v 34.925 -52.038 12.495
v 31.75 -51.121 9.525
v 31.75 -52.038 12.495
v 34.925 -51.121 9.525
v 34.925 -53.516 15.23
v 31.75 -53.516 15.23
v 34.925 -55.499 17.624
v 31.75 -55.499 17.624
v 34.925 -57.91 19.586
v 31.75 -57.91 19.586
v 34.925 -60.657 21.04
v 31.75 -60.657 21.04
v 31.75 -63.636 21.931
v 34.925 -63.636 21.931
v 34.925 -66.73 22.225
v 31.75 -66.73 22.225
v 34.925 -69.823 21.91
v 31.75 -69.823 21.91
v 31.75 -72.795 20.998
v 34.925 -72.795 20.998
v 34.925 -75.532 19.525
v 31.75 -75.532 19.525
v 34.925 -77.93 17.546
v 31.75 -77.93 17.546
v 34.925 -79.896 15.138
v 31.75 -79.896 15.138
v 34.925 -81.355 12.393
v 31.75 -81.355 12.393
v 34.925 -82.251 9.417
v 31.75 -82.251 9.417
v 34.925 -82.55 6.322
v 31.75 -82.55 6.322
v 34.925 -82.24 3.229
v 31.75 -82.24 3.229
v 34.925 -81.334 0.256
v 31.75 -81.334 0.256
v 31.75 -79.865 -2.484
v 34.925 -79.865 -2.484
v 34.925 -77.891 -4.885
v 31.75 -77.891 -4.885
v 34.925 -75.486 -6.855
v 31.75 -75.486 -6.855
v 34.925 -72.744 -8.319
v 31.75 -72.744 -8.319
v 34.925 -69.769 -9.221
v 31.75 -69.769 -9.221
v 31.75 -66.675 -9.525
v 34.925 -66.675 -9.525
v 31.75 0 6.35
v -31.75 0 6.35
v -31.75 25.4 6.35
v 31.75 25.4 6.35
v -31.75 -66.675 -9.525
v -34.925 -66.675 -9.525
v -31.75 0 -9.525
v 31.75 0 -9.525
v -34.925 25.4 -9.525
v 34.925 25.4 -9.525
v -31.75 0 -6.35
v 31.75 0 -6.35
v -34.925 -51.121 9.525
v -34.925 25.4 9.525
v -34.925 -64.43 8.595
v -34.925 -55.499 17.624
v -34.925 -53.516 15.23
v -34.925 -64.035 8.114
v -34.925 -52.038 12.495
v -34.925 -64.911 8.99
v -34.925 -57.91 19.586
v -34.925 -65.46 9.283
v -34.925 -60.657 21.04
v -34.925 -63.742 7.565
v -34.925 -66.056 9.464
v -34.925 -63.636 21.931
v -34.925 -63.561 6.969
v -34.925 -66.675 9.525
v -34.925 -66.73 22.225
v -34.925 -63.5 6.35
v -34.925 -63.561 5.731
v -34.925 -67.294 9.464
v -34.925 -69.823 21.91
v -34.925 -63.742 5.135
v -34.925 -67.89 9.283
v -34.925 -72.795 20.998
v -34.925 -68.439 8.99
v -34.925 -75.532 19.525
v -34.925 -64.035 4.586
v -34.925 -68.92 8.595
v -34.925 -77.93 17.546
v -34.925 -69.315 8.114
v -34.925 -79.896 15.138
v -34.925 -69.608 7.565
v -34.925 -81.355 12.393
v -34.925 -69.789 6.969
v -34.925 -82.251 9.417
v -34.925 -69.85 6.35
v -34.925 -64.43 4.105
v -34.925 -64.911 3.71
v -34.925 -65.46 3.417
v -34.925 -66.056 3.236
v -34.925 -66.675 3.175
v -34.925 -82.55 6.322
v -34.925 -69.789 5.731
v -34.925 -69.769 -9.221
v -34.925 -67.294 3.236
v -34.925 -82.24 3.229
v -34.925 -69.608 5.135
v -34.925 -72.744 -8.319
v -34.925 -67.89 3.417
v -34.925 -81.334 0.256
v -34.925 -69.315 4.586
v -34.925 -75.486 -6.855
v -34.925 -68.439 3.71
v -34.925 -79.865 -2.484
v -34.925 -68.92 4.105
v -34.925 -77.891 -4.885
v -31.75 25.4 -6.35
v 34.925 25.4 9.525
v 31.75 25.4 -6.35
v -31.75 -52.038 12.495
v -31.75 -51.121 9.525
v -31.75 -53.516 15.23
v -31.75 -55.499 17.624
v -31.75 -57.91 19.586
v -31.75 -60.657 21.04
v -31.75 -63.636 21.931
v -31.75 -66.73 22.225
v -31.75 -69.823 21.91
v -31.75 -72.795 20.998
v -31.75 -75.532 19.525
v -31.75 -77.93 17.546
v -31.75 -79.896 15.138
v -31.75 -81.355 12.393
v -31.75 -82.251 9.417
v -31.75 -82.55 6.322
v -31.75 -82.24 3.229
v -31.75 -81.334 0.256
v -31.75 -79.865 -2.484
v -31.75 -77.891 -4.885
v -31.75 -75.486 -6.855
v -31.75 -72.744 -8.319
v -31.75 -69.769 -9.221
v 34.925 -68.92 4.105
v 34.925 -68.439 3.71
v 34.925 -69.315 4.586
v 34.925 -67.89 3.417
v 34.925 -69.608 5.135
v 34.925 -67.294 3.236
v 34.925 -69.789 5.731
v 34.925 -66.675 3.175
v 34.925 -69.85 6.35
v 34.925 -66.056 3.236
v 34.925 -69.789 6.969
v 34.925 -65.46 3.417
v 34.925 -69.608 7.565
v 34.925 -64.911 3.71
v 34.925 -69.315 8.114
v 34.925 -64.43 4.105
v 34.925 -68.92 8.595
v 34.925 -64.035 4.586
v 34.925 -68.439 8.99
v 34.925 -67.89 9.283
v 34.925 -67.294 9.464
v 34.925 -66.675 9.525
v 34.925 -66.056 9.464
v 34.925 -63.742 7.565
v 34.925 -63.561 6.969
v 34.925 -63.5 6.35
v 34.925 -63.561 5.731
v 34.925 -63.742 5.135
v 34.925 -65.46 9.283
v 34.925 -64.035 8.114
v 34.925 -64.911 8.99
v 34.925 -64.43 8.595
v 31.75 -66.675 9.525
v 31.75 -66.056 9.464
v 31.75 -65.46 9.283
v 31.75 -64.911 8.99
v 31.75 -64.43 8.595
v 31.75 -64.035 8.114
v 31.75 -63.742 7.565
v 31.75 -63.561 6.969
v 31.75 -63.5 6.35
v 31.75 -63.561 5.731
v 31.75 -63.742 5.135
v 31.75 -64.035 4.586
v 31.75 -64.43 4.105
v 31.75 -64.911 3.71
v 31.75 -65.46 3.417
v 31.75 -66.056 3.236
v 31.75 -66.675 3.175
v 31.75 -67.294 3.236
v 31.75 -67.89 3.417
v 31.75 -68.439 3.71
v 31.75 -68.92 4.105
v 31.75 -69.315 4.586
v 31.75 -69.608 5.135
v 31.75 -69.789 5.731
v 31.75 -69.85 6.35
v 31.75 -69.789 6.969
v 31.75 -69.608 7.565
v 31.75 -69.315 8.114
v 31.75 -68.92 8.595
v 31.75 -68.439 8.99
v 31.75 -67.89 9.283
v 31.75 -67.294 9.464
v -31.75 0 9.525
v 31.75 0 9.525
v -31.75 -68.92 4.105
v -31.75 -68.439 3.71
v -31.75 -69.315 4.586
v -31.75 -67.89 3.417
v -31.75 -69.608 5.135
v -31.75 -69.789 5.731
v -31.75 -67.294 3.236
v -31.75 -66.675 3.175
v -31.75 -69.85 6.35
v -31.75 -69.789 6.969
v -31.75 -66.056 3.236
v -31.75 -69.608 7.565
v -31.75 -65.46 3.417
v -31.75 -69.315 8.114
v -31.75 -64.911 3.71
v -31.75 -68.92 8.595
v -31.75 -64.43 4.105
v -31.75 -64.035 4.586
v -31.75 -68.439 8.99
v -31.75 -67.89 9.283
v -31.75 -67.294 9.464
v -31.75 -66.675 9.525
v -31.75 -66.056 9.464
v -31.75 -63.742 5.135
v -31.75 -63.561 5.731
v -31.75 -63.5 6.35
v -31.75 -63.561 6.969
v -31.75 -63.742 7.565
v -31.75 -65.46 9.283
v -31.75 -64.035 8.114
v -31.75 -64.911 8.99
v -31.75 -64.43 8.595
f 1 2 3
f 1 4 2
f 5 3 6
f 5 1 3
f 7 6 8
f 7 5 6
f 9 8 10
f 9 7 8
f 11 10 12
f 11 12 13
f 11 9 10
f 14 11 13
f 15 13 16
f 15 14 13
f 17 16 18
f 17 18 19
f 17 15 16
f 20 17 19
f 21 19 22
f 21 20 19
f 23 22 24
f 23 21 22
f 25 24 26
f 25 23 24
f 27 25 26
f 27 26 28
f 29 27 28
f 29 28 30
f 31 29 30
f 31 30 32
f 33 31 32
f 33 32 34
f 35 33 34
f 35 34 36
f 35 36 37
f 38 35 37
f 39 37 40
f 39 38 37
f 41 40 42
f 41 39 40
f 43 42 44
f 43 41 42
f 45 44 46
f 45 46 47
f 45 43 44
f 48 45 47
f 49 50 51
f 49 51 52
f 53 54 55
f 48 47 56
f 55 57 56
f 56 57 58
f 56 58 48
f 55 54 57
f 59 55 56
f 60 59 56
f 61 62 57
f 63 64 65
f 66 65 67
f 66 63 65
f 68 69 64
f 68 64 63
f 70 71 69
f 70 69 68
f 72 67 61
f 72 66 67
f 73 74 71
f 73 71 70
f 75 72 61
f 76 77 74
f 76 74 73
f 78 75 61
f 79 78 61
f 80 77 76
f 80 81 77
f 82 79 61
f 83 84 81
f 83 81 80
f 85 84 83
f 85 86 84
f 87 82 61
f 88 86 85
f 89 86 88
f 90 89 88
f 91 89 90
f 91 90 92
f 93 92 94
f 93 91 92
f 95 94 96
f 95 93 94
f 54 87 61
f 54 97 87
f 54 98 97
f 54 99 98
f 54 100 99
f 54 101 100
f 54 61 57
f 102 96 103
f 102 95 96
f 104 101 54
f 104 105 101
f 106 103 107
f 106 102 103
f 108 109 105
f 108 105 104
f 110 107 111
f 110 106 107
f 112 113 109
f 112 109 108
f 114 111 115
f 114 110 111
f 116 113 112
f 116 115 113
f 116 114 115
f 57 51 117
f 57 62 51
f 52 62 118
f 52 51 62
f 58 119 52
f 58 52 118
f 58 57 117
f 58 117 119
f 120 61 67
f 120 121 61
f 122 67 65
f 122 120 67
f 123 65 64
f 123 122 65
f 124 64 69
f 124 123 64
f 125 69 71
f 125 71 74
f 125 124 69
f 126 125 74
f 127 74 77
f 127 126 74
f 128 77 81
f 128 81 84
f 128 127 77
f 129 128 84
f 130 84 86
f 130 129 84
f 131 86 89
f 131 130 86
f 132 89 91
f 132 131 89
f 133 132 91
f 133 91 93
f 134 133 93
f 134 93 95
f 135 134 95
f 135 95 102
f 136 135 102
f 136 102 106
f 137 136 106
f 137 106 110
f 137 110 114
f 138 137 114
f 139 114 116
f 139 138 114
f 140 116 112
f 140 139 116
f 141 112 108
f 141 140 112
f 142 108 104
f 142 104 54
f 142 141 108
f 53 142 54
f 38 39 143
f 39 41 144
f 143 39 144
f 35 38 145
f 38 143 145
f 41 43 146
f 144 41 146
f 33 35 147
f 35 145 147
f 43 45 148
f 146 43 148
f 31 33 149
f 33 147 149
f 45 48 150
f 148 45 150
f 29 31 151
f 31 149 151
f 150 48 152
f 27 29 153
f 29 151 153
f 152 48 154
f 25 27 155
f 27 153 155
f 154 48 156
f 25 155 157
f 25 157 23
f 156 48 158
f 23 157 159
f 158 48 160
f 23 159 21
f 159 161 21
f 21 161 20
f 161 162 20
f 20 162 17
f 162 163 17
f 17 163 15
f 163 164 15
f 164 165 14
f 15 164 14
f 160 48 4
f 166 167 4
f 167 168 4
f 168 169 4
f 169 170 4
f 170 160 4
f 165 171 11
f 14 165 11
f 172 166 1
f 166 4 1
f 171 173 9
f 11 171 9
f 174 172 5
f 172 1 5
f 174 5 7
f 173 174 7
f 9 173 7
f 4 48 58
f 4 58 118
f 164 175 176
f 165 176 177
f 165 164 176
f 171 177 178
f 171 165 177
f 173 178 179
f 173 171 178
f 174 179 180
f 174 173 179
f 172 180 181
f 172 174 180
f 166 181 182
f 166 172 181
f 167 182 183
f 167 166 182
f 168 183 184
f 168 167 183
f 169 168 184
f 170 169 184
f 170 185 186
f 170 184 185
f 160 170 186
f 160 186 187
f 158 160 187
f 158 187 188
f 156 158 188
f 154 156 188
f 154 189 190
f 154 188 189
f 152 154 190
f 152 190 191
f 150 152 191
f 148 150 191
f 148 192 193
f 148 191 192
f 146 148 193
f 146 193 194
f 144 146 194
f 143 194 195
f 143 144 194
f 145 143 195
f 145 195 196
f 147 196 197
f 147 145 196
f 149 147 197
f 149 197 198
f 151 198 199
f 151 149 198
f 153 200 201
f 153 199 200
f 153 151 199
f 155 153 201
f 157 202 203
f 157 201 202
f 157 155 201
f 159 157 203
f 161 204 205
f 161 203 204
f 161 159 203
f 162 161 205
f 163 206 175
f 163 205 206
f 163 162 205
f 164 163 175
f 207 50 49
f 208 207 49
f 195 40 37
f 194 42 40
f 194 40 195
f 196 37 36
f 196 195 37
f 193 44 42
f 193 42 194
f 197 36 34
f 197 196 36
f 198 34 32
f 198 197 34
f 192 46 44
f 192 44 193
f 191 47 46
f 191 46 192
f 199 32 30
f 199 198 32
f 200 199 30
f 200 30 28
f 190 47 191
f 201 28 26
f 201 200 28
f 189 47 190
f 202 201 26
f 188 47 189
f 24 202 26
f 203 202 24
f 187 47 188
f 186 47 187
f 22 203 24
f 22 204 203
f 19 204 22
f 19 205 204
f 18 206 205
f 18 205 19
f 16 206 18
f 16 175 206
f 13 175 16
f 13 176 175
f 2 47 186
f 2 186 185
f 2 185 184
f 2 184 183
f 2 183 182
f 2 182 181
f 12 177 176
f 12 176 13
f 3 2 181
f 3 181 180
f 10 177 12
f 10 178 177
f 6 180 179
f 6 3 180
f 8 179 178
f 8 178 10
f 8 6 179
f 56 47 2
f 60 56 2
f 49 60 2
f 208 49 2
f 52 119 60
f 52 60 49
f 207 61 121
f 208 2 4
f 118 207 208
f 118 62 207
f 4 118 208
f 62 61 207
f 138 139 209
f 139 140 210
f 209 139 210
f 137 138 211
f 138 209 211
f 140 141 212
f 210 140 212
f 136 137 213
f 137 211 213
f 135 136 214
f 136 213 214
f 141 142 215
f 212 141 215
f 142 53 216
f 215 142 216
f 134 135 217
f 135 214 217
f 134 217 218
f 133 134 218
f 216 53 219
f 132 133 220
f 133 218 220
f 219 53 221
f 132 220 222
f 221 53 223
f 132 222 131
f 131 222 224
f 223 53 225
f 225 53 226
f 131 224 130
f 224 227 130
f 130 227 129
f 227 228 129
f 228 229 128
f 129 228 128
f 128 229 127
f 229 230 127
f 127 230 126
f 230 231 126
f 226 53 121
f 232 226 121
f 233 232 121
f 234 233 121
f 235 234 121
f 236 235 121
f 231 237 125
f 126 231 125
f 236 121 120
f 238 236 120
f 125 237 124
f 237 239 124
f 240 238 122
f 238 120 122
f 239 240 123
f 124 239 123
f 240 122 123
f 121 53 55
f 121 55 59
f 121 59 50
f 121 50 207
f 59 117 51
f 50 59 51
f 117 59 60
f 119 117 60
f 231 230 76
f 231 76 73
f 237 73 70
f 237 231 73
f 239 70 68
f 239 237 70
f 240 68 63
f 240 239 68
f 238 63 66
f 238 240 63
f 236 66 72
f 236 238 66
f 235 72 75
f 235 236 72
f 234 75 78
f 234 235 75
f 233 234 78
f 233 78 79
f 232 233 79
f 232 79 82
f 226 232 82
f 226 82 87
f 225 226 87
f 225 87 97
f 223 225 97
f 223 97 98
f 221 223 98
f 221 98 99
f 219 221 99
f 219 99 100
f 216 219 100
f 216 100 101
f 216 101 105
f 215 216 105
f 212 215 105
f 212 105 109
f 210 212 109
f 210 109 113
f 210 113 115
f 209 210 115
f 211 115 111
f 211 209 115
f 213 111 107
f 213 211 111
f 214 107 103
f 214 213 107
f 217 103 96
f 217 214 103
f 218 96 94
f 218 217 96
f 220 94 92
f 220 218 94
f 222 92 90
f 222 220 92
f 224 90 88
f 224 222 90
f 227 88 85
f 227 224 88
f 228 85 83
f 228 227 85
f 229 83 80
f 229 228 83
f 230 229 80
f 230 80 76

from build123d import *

# Parameters (mm, degrees)
PROBEPROFILE_W      = 69.85
PROBEPROFILE_H      = 19.05
PROBEPROFILE_W_2    = 63.5
PROBEPROFILE_H_2    = 12.7
EXTRUDE_THIN1_DEPTH = 25.4
SKETCH2_R           = 15.875
BOSS_EXTRUDE1_DEPTH = 34.925
SKETCH2_2_R         = 15.875
CUT_EXTRUDE1_DEPTH  = 31.75
SKETCH3_W           = 3.175
SKETCH3_H           = 19.05
BOSS_EXTRUDE2_DEPTH = 66.675
CUT_EXTRUDE2_START  = -69.85
SKETCH4_R           = 3.175
CUT_EXTRUDE2_DEPTH  = 69.85


with BuildPart() as part:
    # ProbeProfile → Extrude-Thin1 (new body)
    with BuildSketch(Plane(origin=(0, 0, 0), x_dir=(1, 0, 0), z_dir=(0, 1, 0))):
        Rectangle(PROBEPROFILE_W, PROBEPROFILE_H)
        Rectangle(PROBEPROFILE_W_2, PROBEPROFILE_H_2, mode=Mode.SUBTRACT)
    extrude(amount=EXTRUDE_THIN1_DEPTH)



with BuildPart() as body_2:
    # Sketch2 → Boss-Extrude1 (new body, symmetric)
    with BuildSketch(Plane(origin=(0, 0, 0), x_dir=(0, 0, -1), z_dir=(1, 0, 0))):
        with Locations((-6.35, -66.675)):
            Circle(SKETCH2_R)
    extrude(amount=BOSS_EXTRUDE1_DEPTH, both=True)

    # Sketch2<2> → Cut-Extrude1 (cut, symmetric)
    with BuildSketch(Plane(origin=(0, 0, 0), x_dir=(0, 0, -1), z_dir=(1, 0, 0))):
        with Locations((-6.35, -66.675)):
            Circle(SKETCH2_2_R)
    extrude(amount=CUT_EXTRUDE1_DEPTH, both=True, mode=Mode.SUBTRACT)


with BuildPart() as part_1:
    add(part.part)

    add(body_2.part)  # Boss-Extrude2 merges body 2
    # Sketch3 → Boss-Extrude2 (add)
    with BuildSketch(Plane.XZ):
        with Locations((33.3375, 0)):
            Rectangle(SKETCH3_W, SKETCH3_H)
        with Locations((-33.3375, 0)):
            Rectangle(SKETCH3_W, SKETCH3_H)
    extrude(amount=BOSS_EXTRUDE2_DEPTH)

    # Sketch4 → Cut-Extrude2 (cut)
    with BuildSketch(Plane.ZY.offset(34.925).offset(CUT_EXTRUDE2_START)):
        with Locations((6.35, -66.675)):
            Circle(SKETCH4_R)
    extrude(amount=CUT_EXTRUDE2_DEPTH, mode=Mode.SUBTRACT)


solid = part_1.part
